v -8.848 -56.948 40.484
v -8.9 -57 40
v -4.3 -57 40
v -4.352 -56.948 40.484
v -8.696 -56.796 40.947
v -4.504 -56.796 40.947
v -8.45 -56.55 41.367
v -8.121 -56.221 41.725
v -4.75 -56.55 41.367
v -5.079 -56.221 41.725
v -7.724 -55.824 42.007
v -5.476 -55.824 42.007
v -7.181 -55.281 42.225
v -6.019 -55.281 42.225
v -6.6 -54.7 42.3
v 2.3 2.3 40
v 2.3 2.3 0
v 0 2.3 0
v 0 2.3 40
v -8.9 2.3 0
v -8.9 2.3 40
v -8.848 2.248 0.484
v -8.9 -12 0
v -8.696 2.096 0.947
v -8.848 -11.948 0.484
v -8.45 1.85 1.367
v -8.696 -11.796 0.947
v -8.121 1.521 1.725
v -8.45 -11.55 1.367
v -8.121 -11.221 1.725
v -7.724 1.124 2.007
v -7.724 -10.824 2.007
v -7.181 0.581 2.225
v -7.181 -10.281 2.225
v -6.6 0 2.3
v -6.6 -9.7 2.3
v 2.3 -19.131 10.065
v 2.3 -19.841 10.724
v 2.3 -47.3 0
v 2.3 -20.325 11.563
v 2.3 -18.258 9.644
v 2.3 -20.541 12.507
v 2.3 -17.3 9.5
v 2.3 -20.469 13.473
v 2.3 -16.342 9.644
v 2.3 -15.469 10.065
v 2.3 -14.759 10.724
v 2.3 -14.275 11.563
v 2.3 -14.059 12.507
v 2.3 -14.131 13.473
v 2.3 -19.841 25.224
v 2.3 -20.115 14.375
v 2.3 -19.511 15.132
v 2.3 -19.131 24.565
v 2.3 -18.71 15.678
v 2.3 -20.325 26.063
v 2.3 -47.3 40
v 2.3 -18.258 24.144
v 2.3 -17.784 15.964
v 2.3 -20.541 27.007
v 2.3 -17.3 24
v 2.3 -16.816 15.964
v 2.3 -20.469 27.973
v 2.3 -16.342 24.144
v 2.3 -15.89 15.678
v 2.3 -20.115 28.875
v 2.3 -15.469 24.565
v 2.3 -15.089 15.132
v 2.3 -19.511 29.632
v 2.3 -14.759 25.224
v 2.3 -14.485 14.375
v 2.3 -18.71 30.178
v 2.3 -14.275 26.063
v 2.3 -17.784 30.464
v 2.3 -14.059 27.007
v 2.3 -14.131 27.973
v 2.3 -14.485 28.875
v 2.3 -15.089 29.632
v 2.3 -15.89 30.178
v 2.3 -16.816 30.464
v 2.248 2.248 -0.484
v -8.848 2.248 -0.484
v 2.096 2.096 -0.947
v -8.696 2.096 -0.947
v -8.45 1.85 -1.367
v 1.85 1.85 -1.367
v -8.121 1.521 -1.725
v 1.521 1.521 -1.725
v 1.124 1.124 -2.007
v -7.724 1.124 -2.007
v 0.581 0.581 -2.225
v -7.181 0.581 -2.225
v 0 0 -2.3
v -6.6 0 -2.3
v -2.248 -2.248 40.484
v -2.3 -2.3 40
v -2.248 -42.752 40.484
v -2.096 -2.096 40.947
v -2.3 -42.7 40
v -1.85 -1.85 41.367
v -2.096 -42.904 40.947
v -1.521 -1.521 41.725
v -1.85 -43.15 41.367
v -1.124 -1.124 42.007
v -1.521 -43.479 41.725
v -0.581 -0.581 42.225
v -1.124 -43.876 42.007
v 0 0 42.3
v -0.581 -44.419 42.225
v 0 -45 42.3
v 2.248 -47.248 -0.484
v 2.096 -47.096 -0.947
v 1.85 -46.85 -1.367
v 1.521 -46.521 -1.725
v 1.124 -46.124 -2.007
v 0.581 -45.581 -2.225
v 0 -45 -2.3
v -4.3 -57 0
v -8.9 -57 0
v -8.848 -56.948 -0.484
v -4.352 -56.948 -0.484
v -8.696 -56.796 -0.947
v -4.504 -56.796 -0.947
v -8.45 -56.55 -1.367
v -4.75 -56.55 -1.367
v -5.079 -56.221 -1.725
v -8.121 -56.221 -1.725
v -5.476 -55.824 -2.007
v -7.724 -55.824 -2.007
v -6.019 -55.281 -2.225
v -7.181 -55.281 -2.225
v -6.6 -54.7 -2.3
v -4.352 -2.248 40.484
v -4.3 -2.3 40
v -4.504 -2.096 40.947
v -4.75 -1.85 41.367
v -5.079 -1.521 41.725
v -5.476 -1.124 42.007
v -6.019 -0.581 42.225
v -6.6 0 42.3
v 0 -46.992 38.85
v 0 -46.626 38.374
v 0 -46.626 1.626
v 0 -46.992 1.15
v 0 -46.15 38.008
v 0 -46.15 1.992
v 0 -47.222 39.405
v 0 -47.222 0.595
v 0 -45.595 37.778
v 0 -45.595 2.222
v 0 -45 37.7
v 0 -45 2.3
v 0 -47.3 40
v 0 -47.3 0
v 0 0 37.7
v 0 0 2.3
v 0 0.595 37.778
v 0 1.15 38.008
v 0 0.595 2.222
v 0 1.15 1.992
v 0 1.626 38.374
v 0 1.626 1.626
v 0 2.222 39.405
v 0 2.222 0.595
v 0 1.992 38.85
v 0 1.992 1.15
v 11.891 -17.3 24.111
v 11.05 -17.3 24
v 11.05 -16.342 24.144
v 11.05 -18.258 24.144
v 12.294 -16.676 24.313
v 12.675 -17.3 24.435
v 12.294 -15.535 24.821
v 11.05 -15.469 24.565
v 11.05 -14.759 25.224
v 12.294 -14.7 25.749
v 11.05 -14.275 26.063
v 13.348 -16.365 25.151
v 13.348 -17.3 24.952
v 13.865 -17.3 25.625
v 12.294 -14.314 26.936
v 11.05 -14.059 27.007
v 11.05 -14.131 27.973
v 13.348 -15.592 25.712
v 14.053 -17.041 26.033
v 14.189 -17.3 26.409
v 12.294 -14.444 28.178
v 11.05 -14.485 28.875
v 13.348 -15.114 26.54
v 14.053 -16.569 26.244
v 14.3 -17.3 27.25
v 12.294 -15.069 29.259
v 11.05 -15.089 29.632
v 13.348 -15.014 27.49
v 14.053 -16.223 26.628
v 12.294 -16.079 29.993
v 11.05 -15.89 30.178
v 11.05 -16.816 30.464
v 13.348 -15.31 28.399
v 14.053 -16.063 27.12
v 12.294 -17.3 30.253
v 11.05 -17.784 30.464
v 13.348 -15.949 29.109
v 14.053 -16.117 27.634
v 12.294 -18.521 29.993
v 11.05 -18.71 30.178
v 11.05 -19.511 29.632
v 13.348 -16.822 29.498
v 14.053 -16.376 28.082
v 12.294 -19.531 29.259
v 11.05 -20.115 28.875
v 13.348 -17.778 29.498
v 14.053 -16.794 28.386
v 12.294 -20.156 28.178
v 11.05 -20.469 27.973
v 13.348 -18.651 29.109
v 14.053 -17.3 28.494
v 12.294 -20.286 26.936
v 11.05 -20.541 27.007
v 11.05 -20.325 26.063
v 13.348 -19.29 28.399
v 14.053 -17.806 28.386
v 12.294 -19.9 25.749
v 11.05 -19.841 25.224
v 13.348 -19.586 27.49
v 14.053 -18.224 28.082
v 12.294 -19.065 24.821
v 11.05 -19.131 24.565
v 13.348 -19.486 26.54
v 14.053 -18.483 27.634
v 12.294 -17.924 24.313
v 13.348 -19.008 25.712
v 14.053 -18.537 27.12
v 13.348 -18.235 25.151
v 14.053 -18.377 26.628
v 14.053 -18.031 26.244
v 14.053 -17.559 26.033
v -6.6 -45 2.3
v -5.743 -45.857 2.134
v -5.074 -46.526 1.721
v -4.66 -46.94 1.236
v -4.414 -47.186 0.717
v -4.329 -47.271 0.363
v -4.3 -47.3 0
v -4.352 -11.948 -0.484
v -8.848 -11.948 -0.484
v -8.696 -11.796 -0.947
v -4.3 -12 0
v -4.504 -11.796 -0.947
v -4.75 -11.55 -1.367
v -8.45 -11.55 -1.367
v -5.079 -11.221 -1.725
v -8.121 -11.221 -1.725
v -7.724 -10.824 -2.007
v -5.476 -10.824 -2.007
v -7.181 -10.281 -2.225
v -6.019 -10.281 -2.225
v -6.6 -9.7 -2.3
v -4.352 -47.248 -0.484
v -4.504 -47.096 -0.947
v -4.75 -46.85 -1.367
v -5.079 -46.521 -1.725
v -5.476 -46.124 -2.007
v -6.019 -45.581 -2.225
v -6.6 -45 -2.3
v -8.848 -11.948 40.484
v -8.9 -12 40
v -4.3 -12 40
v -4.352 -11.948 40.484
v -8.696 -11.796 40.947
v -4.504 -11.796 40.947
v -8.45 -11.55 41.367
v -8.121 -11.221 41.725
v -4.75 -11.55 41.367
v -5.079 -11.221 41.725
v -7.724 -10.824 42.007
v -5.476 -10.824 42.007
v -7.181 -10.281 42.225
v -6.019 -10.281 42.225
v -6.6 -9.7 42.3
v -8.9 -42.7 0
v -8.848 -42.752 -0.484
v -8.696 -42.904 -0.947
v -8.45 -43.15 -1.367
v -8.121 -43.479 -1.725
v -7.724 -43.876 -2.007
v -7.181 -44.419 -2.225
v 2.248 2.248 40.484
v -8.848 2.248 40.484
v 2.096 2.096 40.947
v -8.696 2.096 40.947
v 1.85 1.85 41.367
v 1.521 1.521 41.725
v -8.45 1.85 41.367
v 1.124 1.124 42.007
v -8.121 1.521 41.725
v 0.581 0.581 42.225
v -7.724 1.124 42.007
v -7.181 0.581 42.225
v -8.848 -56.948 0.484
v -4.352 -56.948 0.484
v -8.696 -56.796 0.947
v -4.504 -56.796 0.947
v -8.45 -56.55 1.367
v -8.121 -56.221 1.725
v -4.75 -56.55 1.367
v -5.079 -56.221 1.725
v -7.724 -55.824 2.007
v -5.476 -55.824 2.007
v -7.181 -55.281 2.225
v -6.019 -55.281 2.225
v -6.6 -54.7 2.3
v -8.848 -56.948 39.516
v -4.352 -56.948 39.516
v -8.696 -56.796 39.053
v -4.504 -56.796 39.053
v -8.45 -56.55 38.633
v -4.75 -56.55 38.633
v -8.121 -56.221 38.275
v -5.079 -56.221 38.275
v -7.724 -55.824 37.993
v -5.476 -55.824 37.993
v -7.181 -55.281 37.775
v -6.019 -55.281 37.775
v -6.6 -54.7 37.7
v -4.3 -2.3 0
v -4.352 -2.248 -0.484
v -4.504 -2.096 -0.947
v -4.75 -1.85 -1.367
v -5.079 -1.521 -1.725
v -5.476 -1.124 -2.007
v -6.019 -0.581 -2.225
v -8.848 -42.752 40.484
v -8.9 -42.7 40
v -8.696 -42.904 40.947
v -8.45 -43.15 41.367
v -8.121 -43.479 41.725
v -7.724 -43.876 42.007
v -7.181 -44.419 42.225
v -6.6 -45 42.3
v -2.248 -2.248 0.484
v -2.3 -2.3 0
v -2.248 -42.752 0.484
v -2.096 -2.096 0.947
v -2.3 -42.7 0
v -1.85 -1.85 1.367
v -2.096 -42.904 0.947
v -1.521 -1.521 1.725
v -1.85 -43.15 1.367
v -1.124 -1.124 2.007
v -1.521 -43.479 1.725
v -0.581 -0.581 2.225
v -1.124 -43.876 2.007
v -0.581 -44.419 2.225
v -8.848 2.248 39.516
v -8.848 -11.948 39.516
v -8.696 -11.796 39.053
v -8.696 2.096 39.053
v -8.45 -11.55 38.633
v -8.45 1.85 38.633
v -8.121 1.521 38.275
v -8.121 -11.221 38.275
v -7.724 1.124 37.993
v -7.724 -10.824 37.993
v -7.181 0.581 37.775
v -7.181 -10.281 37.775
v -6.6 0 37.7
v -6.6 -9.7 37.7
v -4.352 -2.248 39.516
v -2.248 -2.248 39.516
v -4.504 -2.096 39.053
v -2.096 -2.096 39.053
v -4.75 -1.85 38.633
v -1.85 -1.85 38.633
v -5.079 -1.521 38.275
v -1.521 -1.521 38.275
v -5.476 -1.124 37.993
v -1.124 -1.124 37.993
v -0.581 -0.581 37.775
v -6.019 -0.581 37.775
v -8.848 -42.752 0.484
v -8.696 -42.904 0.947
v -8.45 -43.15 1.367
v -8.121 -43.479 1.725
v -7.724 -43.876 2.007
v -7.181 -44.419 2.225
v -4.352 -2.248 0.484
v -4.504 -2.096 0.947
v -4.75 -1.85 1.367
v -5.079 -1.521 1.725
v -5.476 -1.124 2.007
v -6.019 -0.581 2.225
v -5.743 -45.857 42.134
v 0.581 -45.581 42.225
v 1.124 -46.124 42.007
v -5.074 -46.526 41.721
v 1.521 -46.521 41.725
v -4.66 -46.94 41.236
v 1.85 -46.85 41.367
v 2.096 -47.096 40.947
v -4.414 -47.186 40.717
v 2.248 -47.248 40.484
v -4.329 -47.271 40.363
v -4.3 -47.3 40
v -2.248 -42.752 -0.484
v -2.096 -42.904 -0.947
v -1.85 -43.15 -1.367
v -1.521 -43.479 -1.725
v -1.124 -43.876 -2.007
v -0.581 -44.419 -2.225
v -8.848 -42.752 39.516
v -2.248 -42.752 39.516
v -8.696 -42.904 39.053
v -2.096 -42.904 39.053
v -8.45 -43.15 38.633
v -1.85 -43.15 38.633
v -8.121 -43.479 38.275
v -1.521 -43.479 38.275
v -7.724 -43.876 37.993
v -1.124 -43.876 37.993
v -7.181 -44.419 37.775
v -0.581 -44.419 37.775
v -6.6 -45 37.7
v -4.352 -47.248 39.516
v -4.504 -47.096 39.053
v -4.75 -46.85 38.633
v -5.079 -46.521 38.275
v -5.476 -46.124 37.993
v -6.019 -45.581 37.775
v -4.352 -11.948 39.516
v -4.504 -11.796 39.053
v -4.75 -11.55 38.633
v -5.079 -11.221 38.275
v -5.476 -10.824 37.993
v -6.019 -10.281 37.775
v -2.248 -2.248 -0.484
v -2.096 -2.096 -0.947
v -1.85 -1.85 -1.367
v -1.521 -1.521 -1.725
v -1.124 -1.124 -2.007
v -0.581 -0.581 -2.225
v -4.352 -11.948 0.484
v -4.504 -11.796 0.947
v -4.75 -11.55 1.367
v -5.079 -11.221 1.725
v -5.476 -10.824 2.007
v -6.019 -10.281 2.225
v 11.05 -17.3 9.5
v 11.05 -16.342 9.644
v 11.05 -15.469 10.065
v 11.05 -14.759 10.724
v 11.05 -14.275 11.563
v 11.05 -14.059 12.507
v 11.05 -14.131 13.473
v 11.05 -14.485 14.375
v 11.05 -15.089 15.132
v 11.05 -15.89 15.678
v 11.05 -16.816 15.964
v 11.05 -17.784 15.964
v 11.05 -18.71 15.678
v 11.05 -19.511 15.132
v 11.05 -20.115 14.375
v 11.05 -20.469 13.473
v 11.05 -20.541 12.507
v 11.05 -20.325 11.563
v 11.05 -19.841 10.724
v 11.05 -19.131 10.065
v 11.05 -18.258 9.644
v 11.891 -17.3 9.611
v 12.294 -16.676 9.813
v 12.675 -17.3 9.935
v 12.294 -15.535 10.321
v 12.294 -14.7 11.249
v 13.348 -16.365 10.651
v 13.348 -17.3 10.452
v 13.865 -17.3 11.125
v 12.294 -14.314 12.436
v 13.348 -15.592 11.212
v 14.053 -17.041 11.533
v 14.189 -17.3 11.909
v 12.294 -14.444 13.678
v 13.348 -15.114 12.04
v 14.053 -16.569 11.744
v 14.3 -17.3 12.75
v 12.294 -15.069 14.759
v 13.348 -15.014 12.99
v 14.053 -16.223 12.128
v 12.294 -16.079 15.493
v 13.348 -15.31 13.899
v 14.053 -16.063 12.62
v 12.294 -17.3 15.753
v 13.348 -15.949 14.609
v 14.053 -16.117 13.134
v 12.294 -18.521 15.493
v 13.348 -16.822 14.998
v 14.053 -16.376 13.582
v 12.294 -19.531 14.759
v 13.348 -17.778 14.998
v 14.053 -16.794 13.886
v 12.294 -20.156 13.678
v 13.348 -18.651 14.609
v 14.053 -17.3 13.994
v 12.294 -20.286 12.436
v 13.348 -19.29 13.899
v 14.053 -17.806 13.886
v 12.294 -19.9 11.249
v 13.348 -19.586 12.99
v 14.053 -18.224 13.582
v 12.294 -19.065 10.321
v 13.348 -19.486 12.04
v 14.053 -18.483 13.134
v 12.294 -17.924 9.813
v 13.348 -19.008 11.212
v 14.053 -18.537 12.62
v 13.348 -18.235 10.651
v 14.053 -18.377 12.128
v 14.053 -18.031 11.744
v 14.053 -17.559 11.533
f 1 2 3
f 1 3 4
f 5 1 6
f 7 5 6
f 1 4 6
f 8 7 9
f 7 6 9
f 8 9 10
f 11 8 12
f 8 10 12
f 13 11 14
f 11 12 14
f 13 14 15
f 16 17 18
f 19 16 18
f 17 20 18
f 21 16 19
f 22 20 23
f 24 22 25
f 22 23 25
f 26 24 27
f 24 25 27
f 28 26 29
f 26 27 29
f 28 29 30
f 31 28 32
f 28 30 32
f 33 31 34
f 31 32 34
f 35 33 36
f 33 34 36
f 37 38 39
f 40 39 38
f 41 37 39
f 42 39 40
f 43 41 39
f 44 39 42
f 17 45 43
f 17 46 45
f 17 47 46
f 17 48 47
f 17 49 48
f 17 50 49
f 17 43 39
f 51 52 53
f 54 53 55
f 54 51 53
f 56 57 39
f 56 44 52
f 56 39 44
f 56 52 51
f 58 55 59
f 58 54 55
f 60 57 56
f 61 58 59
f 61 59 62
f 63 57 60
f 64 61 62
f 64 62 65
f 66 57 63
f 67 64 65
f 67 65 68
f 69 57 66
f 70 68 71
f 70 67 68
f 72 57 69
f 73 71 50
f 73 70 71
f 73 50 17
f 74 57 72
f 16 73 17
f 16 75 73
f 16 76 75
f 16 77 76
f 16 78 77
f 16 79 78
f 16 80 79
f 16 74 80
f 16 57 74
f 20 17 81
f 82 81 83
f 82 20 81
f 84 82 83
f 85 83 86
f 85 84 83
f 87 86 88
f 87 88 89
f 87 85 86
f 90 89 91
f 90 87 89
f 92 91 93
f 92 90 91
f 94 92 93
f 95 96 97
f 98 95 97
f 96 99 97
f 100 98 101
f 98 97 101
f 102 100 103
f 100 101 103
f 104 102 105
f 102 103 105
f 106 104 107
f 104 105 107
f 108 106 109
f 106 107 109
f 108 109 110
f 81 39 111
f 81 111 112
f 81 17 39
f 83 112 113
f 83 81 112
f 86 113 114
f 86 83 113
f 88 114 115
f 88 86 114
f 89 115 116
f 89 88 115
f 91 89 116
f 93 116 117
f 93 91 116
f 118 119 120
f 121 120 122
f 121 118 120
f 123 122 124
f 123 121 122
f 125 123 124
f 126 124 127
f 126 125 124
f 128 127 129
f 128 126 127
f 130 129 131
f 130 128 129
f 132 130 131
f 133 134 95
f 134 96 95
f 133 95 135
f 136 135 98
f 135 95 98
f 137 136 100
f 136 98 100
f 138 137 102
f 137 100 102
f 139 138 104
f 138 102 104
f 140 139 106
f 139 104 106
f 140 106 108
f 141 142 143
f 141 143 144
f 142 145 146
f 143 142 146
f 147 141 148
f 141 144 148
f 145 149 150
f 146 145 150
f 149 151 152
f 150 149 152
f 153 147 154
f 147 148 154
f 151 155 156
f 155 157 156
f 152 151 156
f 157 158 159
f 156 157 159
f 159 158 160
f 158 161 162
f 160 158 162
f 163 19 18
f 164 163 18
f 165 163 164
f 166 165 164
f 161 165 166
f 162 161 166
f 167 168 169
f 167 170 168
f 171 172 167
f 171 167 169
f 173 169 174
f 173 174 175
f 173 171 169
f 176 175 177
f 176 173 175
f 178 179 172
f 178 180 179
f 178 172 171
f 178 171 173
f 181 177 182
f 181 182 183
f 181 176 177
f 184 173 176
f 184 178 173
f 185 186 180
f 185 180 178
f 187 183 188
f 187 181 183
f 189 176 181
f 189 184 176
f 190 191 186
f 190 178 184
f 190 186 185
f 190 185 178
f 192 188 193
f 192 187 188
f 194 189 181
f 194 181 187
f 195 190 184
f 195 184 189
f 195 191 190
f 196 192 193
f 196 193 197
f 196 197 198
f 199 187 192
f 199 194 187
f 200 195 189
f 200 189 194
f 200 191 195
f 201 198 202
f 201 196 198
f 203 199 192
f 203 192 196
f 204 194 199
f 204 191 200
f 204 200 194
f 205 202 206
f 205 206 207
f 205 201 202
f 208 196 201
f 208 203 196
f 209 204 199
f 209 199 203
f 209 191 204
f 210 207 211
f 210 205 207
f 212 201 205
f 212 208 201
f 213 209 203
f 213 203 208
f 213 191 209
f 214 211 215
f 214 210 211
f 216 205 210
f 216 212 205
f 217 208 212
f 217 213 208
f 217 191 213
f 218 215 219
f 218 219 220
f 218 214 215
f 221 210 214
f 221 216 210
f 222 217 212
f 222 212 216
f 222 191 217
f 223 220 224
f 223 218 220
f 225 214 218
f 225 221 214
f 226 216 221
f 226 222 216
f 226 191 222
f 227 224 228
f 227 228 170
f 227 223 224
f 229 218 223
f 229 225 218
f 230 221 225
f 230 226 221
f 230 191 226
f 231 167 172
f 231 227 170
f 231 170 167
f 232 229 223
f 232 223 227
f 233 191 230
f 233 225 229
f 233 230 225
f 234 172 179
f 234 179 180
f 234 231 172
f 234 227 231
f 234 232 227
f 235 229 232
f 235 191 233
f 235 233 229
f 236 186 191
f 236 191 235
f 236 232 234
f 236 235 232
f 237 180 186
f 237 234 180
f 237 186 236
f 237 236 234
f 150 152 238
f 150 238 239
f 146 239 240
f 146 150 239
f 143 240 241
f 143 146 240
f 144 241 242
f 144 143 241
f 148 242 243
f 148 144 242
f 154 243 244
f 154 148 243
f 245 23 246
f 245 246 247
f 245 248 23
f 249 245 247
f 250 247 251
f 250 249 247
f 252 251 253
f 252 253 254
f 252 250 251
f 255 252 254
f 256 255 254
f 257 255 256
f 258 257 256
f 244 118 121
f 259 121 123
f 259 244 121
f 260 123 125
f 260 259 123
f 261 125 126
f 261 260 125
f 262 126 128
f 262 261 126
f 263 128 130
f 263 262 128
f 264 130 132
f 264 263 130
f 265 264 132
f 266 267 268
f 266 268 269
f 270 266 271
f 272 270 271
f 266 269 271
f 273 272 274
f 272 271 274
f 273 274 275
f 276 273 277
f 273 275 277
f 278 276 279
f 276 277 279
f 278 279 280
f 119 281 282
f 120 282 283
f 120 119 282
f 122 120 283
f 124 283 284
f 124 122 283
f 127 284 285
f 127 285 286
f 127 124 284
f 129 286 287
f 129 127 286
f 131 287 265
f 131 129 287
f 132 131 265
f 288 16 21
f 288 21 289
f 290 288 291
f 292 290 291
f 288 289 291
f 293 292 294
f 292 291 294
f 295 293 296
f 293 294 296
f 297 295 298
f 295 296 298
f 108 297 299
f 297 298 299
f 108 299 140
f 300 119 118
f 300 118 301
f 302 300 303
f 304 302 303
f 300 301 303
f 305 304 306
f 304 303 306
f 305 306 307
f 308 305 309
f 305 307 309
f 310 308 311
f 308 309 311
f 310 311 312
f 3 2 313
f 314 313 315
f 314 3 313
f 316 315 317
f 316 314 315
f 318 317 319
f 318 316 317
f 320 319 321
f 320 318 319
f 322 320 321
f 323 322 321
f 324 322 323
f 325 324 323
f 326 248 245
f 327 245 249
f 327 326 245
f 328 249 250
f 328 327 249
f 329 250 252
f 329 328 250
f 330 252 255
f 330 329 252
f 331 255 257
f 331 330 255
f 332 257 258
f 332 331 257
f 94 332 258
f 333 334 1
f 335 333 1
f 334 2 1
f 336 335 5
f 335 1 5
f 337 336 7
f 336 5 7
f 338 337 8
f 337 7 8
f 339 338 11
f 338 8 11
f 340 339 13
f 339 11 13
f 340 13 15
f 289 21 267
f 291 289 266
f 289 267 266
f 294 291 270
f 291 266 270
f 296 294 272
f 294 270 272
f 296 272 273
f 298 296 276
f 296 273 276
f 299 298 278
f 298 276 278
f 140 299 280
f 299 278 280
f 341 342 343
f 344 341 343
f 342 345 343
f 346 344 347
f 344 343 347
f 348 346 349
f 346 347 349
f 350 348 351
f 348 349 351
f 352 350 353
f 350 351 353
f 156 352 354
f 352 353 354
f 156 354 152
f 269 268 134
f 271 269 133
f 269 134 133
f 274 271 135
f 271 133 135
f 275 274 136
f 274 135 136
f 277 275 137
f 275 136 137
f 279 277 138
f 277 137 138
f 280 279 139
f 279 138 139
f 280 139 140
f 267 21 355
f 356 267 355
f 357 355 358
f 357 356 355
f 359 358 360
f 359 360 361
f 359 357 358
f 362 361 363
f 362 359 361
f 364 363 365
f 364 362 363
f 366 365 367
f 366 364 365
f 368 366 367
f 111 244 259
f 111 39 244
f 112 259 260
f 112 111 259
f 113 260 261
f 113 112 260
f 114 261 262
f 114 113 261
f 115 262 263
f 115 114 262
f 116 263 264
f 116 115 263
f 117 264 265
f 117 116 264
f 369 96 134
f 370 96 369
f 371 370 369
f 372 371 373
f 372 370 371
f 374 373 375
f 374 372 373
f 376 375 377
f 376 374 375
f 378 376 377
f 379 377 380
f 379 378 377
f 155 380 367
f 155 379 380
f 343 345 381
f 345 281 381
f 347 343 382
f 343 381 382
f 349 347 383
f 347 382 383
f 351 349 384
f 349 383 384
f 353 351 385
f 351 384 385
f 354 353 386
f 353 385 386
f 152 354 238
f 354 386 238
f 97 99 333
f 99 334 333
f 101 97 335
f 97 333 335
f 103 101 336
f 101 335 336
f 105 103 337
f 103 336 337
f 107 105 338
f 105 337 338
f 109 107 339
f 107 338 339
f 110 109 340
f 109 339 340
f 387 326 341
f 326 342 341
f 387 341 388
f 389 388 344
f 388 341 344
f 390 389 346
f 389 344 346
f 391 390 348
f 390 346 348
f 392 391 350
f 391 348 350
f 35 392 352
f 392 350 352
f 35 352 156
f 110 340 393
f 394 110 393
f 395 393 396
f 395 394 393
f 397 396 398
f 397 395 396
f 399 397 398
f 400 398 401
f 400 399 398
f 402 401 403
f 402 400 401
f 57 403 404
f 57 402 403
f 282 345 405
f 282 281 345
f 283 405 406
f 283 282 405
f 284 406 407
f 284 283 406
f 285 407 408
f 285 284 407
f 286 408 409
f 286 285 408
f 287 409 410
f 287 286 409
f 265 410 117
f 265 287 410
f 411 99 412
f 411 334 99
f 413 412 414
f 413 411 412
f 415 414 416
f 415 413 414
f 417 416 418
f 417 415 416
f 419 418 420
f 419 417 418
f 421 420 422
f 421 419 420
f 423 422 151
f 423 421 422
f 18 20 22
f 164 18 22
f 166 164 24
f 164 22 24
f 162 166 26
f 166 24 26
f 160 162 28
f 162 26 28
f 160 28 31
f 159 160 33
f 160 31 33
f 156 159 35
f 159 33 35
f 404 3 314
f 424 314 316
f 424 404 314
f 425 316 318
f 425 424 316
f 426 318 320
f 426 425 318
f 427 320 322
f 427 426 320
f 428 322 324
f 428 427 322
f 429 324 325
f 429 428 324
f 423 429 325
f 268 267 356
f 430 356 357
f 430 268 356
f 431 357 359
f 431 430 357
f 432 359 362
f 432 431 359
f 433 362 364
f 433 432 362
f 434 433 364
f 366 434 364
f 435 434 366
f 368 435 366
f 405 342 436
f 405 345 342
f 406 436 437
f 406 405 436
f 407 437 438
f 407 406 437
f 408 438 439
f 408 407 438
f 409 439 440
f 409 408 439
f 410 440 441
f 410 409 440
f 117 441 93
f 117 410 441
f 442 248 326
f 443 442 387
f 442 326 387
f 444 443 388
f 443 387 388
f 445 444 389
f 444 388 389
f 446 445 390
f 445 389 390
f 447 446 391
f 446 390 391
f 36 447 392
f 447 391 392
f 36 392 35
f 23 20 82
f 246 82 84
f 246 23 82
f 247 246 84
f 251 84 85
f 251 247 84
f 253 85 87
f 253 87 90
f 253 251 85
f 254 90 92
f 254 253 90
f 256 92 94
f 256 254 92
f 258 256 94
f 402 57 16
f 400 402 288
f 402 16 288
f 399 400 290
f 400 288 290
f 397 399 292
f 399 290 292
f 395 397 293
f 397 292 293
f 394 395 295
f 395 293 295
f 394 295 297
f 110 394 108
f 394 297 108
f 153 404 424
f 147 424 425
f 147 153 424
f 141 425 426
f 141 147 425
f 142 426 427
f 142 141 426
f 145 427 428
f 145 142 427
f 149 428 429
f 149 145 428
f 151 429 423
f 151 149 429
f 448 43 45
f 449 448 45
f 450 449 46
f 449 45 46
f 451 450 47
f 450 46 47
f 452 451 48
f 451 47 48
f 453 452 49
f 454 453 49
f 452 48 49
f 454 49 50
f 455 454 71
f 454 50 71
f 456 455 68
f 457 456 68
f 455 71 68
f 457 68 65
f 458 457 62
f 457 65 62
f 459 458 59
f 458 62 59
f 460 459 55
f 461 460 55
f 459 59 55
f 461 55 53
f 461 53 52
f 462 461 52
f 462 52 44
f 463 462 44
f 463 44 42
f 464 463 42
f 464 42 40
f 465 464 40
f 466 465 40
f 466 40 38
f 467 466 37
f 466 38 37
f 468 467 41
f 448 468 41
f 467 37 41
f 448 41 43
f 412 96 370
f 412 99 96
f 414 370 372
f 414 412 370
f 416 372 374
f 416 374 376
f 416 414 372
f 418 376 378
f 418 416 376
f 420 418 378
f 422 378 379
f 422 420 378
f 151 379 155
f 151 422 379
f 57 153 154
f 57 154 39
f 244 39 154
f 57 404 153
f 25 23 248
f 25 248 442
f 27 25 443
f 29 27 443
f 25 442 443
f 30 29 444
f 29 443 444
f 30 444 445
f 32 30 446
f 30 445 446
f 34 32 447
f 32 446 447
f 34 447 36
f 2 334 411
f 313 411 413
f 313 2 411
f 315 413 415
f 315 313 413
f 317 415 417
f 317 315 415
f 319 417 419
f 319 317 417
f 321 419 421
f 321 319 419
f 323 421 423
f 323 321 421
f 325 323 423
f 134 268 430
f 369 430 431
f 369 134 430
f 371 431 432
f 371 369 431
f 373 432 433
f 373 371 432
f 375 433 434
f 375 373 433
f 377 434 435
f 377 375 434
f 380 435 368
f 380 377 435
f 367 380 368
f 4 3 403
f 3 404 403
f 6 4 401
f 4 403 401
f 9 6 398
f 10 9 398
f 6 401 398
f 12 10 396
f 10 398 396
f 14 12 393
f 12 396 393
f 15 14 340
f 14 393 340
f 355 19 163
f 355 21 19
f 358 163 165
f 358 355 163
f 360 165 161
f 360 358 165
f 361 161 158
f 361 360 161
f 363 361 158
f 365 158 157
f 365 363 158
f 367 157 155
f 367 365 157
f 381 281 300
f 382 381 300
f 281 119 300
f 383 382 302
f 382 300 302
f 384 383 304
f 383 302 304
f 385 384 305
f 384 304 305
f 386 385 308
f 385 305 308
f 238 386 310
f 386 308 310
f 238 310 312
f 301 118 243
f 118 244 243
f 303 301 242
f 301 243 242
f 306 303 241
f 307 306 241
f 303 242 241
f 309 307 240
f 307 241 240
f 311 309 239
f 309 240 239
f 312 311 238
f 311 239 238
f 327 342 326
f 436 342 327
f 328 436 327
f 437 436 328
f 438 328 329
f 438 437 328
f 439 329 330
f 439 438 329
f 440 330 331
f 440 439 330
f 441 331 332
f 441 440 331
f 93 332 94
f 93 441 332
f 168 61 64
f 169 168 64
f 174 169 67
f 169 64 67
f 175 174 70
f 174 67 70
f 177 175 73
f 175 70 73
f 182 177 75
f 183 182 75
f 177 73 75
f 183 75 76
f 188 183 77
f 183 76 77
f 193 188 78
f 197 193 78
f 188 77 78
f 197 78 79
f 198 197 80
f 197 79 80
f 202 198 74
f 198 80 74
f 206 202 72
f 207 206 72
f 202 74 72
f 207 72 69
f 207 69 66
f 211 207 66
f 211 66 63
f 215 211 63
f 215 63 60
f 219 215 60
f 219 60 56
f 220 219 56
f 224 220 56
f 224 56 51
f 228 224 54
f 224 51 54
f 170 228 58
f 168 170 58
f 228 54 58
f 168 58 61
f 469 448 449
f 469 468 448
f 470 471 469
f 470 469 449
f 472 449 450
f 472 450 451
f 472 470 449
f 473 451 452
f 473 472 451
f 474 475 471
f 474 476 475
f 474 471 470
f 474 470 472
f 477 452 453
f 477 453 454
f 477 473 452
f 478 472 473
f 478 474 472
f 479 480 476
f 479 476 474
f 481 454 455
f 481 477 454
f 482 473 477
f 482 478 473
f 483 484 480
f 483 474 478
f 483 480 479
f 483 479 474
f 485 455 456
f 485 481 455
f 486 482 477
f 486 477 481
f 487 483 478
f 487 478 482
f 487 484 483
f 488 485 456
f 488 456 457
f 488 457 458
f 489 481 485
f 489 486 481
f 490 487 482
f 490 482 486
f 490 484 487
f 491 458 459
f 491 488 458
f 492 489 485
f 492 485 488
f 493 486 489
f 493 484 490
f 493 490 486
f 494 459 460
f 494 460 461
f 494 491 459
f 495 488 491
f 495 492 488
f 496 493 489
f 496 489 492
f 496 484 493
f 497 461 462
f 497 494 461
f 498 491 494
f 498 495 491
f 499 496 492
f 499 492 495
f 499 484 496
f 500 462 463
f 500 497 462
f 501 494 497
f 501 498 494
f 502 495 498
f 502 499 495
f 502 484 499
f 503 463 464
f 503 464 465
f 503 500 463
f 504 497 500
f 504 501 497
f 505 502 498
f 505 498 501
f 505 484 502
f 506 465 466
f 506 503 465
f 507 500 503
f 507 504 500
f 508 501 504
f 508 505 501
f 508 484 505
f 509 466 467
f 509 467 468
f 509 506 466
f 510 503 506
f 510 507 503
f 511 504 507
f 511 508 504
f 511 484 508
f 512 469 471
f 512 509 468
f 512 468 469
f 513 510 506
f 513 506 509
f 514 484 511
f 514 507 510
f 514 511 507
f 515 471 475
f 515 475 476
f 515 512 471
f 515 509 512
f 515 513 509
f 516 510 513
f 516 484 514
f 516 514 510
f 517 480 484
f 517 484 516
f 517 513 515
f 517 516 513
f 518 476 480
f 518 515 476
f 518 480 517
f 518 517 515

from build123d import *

# Parameters (mm, degrees)
EXTRU_MINCE1_DEPTH         = 2.3
CONG_1_R                   = 2.3
ESQUISSE2_W                = 40
ESQUISSE2_H                = 49.6
BOSS_EXTRU_1_DEPTH         = 2.3
R_P_TITION_LIN_AIRE1_COUNT = 2
R_P_TITION_LIN_AIRE1_PITCH = 40
CONG_2_R                   = 2.3
ESQUISSE3_R                = 3.25
BOSS_EXTRU_2_DEPTH         = 12
CONG_3_R                   = 3.25


with BuildPart() as part:
    # Esquisse1 → Extru.-Mince1 (new, symmetric)
    with BuildSketch(Plane.XY):
        Polygon((-4.3, -57), (-4.3, -47.3), (2.3, -47.3), (2.3, 2.3), (-8.9, 2.3), (-8.9, -12), (-4.3, -12), (-4.3, -2.3), (-2.3, -2.3), (-2.3, -42.7), (-8.9, -42.7), (-8.9, -57), align=None)
    extru_mince1 = extrude(amount=EXTRU_MINCE1_DEPTH, both=True)

    # Congé1
    cong_1_edges = [part.edges().sort_by_distance(p)[0] for p in [
        (-6.6, -57, -2.3),
        (-4.3, -52.15, -2.3),
        (-1, -47.3, -2.3),
        (2.3, -22.5, -2.3),
        (-3.3, 2.3, -2.3),
        (-8.9, -4.85, -2.3),
        (-6.6, -12, -2.3),
        (-4.3, -7.15, -2.3),
        (-3.3, -2.3, -2.3),
        (-2.3, -22.5, -2.3),
        (-5.6, -42.7, -2.3),
        (-8.9, -49.85, -2.3),
        (-5.6, -42.7, 2.3),
        (-2.3, -22.5, 2.3),
        (-3.3, -2.3, 2.3),
        (-4.3, -7.15, 2.3),
        (-6.6, -12, 2.3),
        (-8.9, -4.85, 2.3),
        (-3.3, 2.3, 2.3),
        (2.3, -22.5, 2.3),
        (-1, -47.3, 2.3),
        (-4.3, -52.15, 2.3),
        (-6.6, -57, 2.3),
        (-8.9, -49.85, 2.3),
    ]]
    fillet(cong_1_edges, radius=CONG_1_R - 0.0001)  # a hair under: the kernel refuses the full size

    # Esquisse2 → Boss.-Extru.1 (add)
    with BuildSketch(Plane(origin=(0, 0, 0), x_dir=(0, 0, -1), z_dir=(1, 0, 0))):
        with Locations((-20, -22.5)):
            Rectangle(ESQUISSE2_W, ESQUISSE2_H)
    extrude(amount=BOSS_EXTRU_1_DEPTH)

    # Répétition linéaire1: Extru.-Mince1 ×2
    with Locations(*[(0, 0, i * R_P_TITION_LIN_AIRE1_PITCH) for i in range(1, R_P_TITION_LIN_AIRE1_COUNT)]):
        add(extru_mince1)

    # Congé2
    cong_2_edges = [part.edges().sort_by_distance(p)[0] for p in [
        (-5.6, -42.7, 42.3),
        (-2.3, -22.5, 42.3),
        (-3.3, -2.3, 42.3),
        (-4.3, -7.15, 42.3),
        (-6.6, -12, 42.3),
        (-8.9, -4.85, 42.3),
        (-3.3, 2.3, 42.3),
        (2.3, -22.5, 42.3),
        (-1, -47.3, 42.3),
        (-4.3, -52.15, 42.3),
        (-6.6, -57, 42.3),
        (-8.9, -49.85, 42.3),
        (-2.15, -47.3, 37.7),
        (-4.3, -52.15, 37.7),
        (-6.6, -57, 37.7),
        (-8.9, -49.85, 37.7),
        (-5.6, -42.7, 37.7),
        (-2.3, -22.5, 37.7),
        (-3.3, -2.3, 37.7),
        (-4.3, -7.15, 37.7),
        (-6.6, -12, 37.7),
        (-8.9, -4.85, 37.7),
        (-4.45, 2.3, 37.7),
    ]]
    fillet(cong_2_edges, radius=CONG_2_R - 0.0001)  # a hair under: the kernel refuses the full size

    # Esquisse3 → Boss.-Extru.2 (add)
    with BuildSketch(Plane(origin=(2.3, 0, 0), x_dir=(0, 0, -1), z_dir=(1, 0, 0))):
        with Locations((-27.25, -17.3)):
            Circle(ESQUISSE3_R)
        with Locations((-12.75, -17.3)):
            Circle(ESQUISSE3_R)
    extrude(amount=BOSS_EXTRU_2_DEPTH)

    # Congé3
    cong_3_edges = [part.edges().sort_by_distance(p)[0] for p in [
        (14.3, -17.3, 30.5),
        (14.3, -17.3, 16),
    ]]
    fillet(cong_3_edges, radius=CONG_3_R)


solid = part.part
